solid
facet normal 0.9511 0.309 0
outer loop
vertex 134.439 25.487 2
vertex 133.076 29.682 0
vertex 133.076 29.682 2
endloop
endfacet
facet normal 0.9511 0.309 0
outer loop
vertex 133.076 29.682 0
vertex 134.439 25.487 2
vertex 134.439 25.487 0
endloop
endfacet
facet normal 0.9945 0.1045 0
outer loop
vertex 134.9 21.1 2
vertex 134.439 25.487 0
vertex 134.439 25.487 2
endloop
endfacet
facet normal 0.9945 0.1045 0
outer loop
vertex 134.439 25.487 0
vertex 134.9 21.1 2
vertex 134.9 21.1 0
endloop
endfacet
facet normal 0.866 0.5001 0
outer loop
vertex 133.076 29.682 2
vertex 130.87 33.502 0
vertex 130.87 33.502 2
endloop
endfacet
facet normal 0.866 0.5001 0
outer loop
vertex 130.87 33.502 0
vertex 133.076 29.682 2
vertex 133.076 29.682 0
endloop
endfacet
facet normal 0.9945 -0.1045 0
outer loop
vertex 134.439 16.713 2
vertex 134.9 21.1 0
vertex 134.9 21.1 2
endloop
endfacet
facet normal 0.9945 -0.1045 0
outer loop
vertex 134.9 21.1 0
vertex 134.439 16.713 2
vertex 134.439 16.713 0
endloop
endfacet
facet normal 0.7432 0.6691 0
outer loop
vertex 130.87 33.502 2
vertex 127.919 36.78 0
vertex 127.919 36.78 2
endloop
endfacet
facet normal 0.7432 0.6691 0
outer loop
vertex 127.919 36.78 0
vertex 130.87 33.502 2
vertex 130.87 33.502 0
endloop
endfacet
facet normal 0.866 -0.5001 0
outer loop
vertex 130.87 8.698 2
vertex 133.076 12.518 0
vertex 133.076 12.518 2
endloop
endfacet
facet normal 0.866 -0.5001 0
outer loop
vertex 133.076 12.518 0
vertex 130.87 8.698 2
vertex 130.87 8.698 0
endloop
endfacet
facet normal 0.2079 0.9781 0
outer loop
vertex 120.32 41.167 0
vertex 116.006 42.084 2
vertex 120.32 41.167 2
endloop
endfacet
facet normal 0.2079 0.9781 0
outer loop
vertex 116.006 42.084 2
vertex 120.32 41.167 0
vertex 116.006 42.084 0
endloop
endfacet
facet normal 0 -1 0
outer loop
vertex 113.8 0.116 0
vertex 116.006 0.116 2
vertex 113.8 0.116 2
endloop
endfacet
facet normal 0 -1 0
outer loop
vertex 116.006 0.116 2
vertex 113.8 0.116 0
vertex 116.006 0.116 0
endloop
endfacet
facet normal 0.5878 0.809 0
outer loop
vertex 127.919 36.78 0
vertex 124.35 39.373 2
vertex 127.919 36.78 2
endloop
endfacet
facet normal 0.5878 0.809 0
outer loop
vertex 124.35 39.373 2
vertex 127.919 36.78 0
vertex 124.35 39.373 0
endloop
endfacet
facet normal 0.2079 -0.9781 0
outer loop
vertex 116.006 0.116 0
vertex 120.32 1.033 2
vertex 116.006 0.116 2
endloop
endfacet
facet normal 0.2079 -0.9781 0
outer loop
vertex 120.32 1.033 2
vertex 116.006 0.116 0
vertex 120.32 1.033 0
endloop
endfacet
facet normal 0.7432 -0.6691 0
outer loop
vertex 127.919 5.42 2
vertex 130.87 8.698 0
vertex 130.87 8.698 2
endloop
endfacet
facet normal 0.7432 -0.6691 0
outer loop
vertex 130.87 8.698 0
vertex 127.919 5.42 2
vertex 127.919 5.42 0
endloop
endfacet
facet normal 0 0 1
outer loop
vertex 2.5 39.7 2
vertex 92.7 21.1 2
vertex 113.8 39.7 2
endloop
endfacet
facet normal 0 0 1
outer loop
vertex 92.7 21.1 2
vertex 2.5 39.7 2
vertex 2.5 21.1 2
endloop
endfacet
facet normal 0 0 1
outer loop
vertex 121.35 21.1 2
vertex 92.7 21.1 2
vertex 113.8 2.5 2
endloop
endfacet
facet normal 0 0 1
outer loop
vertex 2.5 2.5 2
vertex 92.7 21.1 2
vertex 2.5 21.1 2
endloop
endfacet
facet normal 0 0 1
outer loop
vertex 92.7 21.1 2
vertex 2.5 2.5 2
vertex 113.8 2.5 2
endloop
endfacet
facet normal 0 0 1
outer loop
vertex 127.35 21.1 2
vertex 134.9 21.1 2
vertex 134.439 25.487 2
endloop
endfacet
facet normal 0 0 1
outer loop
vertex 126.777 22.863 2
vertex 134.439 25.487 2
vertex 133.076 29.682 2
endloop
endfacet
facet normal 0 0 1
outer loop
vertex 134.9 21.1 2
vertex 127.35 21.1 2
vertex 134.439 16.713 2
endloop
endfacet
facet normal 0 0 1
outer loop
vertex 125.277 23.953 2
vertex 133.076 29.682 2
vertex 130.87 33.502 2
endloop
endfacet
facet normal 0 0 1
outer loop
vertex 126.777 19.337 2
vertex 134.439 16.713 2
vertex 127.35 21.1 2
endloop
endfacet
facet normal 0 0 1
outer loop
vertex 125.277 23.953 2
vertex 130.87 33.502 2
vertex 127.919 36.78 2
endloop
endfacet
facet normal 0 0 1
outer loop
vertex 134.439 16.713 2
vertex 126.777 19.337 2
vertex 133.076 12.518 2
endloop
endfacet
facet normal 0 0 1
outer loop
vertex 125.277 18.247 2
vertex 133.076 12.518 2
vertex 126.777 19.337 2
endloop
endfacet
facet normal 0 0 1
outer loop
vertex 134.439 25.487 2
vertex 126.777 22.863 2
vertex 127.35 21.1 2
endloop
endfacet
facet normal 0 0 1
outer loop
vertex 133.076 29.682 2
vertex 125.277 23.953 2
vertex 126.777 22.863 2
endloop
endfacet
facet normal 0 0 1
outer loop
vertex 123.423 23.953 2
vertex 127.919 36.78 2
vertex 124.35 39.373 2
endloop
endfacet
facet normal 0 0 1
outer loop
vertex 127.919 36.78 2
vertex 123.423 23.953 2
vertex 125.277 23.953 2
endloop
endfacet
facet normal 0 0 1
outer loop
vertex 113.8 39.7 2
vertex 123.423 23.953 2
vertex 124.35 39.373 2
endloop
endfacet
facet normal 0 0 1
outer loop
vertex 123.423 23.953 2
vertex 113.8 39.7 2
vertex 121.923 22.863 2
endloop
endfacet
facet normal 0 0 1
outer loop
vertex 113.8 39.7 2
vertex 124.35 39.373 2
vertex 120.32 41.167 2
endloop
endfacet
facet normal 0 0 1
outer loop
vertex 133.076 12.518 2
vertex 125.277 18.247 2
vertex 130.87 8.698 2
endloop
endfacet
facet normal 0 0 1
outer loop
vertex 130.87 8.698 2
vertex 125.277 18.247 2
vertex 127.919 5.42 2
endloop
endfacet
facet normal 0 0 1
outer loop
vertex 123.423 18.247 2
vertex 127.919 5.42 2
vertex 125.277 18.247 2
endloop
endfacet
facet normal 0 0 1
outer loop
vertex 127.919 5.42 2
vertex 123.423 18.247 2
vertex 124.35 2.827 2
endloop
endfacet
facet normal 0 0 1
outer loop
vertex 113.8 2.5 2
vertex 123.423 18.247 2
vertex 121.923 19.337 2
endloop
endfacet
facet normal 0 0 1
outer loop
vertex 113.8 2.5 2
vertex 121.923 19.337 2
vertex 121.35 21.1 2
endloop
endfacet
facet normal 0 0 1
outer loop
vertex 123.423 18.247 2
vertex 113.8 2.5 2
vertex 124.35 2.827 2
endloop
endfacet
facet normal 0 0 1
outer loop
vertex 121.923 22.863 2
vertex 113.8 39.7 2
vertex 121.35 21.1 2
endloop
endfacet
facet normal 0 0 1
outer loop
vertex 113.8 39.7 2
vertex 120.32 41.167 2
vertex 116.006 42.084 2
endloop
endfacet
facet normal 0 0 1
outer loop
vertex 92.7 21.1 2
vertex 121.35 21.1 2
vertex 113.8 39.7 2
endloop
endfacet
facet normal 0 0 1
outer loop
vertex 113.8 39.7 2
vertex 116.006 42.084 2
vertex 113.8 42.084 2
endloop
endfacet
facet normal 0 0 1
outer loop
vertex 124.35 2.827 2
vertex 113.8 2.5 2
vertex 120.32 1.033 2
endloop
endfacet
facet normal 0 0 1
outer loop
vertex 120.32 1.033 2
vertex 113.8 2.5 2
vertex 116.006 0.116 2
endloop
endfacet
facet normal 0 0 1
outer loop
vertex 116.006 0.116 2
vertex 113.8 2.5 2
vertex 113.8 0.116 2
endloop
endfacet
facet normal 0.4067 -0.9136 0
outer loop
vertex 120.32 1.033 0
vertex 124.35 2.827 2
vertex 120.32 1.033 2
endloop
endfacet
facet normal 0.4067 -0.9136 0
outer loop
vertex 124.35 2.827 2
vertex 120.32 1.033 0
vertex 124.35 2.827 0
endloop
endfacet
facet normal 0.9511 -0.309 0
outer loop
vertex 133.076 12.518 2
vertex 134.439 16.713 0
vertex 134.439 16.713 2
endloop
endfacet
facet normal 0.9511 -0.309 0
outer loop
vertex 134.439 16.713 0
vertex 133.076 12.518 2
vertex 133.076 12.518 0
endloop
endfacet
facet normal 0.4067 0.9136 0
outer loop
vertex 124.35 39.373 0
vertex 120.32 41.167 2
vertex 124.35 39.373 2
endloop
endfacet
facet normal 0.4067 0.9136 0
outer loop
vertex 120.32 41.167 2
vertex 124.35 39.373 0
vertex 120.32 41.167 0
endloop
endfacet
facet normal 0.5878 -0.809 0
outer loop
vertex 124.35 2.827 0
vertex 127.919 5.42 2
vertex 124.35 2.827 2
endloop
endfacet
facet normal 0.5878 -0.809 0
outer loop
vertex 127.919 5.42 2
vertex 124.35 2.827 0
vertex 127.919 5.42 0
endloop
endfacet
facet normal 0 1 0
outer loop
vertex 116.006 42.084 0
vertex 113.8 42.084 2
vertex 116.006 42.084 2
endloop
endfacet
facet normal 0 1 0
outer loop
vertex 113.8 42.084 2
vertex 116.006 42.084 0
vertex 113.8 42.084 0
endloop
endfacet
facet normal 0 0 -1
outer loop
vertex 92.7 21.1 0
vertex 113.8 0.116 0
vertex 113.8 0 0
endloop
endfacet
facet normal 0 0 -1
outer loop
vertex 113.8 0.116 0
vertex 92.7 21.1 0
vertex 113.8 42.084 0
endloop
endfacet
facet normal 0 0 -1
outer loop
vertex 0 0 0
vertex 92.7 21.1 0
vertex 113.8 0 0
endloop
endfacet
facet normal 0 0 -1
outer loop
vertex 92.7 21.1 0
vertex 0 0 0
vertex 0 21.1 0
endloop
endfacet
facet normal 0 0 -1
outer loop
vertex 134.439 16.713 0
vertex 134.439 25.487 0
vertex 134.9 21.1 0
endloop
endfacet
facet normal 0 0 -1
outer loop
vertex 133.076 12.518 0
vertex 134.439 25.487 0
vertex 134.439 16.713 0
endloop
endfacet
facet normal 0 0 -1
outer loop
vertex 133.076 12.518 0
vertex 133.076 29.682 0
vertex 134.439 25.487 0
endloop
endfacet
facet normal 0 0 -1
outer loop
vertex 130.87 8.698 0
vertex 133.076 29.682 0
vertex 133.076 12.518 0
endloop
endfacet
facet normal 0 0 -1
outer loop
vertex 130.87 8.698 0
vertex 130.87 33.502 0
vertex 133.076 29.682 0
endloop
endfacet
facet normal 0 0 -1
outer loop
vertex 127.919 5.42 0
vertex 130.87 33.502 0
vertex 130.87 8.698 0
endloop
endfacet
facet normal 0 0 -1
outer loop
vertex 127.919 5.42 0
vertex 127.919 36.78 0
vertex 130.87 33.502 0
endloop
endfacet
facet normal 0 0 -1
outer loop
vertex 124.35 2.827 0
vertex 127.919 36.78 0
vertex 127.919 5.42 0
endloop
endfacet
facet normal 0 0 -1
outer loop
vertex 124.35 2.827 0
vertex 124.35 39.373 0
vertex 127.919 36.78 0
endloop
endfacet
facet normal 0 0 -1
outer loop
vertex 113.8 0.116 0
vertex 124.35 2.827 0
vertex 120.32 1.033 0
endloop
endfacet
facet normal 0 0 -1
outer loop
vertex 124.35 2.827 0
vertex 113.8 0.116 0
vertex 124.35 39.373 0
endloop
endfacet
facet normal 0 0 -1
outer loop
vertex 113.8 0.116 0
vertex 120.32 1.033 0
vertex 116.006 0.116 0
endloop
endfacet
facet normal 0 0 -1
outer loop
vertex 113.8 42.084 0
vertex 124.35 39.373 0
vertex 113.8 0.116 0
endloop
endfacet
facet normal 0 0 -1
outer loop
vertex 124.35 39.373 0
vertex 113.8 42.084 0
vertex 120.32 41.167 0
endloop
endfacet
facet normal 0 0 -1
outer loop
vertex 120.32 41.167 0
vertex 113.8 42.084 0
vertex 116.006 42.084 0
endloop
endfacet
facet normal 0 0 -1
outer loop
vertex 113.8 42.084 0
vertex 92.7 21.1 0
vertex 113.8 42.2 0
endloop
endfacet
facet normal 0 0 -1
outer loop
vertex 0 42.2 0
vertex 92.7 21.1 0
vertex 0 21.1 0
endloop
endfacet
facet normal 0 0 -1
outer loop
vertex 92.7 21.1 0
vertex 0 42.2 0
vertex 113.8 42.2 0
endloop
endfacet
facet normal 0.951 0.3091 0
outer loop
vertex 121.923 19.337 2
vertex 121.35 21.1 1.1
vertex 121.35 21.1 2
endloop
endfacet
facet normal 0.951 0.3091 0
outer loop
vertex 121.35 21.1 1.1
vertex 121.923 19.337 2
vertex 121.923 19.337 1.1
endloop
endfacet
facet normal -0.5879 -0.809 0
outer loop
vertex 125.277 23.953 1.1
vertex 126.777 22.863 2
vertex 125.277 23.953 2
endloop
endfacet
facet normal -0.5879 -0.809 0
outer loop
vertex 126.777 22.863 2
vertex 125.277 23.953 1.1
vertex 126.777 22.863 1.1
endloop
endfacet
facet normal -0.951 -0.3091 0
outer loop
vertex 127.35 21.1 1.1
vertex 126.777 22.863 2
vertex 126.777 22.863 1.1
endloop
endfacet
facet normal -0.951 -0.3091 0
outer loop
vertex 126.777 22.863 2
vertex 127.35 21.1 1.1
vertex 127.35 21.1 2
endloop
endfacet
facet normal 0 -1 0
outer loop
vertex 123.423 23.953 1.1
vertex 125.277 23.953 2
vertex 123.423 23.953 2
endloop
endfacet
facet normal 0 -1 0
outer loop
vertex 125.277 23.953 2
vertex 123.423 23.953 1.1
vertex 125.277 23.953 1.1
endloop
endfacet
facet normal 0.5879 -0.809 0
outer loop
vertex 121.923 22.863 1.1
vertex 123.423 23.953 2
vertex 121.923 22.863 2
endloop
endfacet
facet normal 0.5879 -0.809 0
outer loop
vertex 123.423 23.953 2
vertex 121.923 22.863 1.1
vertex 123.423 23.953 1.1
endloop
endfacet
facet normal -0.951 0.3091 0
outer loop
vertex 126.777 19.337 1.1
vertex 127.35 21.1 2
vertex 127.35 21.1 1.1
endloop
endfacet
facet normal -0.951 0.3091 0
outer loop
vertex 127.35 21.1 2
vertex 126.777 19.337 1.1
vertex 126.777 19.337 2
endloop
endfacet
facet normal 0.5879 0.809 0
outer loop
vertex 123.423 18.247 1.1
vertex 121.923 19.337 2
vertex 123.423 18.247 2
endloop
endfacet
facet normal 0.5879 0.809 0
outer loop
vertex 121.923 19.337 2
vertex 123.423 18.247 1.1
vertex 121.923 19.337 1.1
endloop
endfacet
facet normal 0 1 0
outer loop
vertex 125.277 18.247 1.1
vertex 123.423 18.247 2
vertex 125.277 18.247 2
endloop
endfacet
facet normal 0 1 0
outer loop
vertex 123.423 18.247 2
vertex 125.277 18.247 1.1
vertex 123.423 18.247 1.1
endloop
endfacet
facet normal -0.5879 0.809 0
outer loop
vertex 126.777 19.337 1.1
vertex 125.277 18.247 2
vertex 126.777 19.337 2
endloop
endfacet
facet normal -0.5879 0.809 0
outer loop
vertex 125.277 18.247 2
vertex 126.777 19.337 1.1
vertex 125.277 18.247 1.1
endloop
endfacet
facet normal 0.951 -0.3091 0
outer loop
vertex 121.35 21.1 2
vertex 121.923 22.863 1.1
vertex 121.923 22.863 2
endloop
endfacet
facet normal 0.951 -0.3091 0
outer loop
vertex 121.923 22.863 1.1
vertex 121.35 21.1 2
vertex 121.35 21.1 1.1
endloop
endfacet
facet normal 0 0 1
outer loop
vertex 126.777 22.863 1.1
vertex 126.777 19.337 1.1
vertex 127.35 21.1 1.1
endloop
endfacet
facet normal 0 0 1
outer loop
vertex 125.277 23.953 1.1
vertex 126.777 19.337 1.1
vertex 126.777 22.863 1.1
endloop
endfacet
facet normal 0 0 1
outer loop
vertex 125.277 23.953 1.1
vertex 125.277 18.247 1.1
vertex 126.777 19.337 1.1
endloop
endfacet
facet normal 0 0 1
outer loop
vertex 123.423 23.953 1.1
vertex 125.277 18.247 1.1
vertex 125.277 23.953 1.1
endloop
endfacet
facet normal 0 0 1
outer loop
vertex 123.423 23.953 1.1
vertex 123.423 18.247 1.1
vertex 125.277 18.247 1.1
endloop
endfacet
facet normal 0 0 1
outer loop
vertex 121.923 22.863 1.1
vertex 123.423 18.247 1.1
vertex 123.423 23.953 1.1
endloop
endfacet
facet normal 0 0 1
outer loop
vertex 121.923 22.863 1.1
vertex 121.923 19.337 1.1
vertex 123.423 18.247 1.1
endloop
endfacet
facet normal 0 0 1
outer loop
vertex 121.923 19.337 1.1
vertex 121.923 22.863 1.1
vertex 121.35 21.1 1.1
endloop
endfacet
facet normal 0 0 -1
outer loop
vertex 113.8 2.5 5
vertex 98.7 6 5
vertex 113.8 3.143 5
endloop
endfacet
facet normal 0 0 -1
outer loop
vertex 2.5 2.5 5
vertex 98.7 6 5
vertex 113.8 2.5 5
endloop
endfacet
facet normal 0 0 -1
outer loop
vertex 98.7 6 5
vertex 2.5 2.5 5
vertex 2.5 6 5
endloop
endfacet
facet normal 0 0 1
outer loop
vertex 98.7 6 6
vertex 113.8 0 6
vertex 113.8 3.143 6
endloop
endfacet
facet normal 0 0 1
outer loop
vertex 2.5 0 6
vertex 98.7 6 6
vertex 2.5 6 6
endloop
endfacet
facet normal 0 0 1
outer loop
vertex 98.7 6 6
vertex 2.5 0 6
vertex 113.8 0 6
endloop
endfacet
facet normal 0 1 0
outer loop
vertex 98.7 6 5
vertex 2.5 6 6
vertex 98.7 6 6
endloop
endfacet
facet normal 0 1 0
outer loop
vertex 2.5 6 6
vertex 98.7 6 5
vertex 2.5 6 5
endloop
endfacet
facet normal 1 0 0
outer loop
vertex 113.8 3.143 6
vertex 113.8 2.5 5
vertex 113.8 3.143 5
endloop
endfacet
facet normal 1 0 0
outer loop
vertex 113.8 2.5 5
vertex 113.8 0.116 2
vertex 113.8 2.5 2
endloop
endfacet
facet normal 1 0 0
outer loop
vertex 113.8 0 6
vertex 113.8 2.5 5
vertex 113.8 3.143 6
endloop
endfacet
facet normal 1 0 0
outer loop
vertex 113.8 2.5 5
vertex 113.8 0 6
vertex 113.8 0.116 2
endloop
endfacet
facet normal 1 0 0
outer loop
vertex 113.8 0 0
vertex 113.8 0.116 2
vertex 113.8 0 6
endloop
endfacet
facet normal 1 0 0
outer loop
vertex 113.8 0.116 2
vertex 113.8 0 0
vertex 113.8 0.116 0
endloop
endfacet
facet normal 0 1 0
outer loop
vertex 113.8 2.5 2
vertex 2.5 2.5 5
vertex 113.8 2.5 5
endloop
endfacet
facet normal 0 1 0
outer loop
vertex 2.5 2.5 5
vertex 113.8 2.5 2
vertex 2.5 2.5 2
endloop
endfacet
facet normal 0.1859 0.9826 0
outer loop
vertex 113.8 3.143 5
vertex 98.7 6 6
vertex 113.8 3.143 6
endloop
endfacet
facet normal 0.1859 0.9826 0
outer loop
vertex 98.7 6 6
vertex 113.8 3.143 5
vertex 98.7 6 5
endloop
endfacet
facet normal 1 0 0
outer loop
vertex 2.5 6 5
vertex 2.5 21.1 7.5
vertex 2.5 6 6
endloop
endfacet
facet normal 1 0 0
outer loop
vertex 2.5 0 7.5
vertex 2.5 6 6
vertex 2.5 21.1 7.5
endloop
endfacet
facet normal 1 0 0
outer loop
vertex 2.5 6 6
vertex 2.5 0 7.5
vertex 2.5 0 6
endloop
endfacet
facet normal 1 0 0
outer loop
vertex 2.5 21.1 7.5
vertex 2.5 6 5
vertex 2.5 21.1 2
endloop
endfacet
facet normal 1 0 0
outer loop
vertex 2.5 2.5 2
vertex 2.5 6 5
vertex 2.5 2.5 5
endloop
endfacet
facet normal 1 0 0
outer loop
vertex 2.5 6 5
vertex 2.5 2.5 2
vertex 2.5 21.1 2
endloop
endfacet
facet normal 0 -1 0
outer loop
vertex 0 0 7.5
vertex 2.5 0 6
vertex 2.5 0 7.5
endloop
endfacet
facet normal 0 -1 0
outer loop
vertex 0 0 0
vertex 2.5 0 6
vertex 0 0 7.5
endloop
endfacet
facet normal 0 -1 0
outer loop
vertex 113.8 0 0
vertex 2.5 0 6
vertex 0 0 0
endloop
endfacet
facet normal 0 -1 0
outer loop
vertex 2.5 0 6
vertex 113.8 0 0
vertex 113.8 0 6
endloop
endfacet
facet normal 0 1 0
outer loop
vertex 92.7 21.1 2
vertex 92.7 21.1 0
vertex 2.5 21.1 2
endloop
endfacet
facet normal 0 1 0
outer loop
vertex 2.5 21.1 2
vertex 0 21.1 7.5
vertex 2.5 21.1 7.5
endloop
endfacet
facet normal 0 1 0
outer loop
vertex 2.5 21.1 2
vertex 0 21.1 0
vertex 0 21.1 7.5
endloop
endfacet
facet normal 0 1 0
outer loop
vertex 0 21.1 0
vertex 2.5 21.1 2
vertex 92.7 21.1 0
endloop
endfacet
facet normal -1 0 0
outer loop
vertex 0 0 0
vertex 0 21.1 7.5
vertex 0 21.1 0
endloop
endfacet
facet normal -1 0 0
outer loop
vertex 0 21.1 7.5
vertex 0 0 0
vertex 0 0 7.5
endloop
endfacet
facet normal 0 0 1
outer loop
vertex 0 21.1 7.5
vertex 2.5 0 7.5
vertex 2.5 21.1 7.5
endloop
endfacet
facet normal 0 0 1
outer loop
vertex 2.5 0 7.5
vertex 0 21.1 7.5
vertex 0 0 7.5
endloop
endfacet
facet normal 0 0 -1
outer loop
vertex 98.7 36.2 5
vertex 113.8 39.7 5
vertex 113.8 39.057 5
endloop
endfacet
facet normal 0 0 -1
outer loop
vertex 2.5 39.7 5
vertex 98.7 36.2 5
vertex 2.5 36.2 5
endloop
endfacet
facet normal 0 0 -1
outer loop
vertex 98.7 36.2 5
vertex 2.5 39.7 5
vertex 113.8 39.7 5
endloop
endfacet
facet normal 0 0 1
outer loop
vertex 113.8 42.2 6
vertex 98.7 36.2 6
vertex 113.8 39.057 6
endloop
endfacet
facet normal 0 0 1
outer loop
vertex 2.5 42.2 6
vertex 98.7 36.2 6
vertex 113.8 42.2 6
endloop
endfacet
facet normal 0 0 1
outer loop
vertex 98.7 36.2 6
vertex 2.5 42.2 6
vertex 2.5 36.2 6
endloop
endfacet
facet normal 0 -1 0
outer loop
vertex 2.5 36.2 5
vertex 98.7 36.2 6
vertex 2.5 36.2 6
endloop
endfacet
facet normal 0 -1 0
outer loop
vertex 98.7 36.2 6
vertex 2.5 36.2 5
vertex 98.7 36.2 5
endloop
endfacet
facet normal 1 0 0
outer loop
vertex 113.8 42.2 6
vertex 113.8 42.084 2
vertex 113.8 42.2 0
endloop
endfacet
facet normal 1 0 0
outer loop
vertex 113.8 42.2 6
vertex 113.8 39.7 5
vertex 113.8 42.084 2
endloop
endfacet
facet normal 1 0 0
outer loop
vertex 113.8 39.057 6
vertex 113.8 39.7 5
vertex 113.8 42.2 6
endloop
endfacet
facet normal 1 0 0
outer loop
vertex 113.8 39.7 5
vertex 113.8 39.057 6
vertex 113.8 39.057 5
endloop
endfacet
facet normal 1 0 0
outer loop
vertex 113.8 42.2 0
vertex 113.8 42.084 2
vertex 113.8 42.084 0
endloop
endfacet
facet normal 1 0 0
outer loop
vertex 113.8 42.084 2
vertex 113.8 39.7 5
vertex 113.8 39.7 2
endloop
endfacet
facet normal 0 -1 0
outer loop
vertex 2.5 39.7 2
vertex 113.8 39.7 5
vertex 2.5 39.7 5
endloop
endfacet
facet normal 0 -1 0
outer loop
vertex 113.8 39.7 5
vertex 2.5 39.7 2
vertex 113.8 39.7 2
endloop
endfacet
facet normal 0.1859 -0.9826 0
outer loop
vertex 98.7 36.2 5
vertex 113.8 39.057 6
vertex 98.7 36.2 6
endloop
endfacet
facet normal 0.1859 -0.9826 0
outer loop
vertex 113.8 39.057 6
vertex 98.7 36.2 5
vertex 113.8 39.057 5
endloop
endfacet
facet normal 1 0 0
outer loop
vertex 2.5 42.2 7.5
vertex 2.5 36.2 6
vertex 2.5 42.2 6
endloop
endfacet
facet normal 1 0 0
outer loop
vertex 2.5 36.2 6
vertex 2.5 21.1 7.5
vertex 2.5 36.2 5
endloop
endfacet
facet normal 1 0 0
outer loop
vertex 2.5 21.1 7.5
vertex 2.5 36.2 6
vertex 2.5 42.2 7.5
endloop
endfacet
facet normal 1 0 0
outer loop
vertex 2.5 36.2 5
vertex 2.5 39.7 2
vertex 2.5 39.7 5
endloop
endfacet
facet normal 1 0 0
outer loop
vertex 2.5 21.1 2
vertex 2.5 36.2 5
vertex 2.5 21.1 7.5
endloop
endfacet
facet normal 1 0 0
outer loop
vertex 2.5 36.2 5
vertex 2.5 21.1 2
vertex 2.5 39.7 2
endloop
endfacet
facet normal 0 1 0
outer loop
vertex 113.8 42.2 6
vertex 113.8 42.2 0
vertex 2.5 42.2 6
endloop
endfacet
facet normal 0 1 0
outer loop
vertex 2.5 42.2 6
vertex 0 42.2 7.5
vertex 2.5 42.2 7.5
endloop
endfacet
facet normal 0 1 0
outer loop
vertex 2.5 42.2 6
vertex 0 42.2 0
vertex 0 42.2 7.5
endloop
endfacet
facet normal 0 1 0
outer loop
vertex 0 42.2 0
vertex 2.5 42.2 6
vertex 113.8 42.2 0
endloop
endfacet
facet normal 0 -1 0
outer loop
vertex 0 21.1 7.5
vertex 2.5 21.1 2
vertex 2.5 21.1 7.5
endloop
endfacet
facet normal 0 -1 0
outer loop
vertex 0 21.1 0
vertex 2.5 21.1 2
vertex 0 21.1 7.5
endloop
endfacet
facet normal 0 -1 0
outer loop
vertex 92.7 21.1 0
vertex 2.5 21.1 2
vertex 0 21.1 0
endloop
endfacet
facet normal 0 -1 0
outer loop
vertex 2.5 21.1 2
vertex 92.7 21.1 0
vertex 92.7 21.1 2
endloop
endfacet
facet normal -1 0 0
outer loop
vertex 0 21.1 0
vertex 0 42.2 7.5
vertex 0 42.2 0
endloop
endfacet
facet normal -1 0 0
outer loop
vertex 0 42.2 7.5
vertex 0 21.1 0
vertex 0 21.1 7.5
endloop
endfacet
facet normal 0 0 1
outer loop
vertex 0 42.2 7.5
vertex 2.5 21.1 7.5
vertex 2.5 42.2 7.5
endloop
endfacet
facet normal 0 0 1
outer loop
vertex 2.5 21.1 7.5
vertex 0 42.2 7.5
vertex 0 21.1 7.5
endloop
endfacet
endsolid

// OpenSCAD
TOLERANCE           = 0.2;
SIZE_X              = 37;
SIZE_Y              = (37 + TOLERANCE) / 2;
COUNT               = 3;

PADDING             = 0.1;
BASE_HEIGHT         = 2;
STOPPER_Y           = 3.0;
STOPPER_HEIGHT      = 1;
STOPPER_WIDTH       = 3.5;
WALL_WIDTH          = 2.5;
WALL_HEIGHT         = BASE_HEIGHT + STOPPER_Y + STOPPER_HEIGHT;
END_STOPPER_HEIGHT  = WALL_HEIGHT + 1.5;

function pos_x(j) = WALL_WIDTH + (SIZE_X + PADDING)  * (j - 1);

module half() {
  for(i=[1:1:COUNT]) {

    // Walls
    translate([pos_x(i), 0, 0]) {
      color("DarkKhaki") {
        linear_extrude(WALL_HEIGHT) {
          square([SIZE_X + PADDING, WALL_WIDTH]);
        }
      }
    }

    // Stoppers
    difference() {
      translate([pos_x(i), WALL_WIDTH, BASE_HEIGHT + STOPPER_Y]) {
        color("DeepSkyBlue") {
          linear_extrude(STOPPER_HEIGHT) {
            square([SIZE_X + PADDING, STOPPER_WIDTH]);
          }
        }
      }

      if (i == COUNT) {
        translate([pos_x(COUNT),WALL_WIDTH,BASE_HEIGHT + STOPPER_Y])
          linear_extrude(STOPPER_HEIGHT) {
            polygon([[1 + WALL_WIDTH + SIZE_X/2, STOPPER_WIDTH],
                [1 + WALL_WIDTH + SIZE_X, 0],
                [1 + WALL_WIDTH + SIZE_X, STOPPER_WIDTH]]);
          }
      }
    }


    // Cup Platform
    translate([pos_x(i), WALL_WIDTH, 0]) {
      color("red") {
        linear_extrude(BASE_HEIGHT) {
          square([SIZE_X, SIZE_Y]);
        }
      }
    }

    // PADDINGS
    translate([pos_x(i) + SIZE_X, WALL_WIDTH, 0]) {
      color("DarkGreen") {
        linear_extrude(BASE_HEIGHT) {
          square([PADDING, SIZE_Y]);
        }
      }
    }

  }


  // End Stopper
  translate([0,0,0]) {
    color("YellowGreen") {
      linear_extrude(END_STOPPER_HEIGHT) {
        square([WALL_WIDTH, SIZE_Y + WALL_WIDTH]);
      }
    }
  }

  // Supports
//support_count = 10;
//for(i=[SIZE_X/support_count:SIZE_X/support_count:SIZE_X]) {
//  radius = 0.4;
//  translate([radius + i, STOPPER_WIDTH / 2 + WALL_WIDTH, BASE_HEIGHT])
//    cylinder(h=STOPPER_Y, r=radius, center=false);
//}
}

// Holder
translate([pos_x(COUNT) + PADDING + SIZE_X, SIZE_Y + WALL_WIDTH,0]) {
  color("Magenta") {
    difference() {
      cylinder(h=BASE_HEIGHT, r=(SIZE_Y + WALL_WIDTH), center=false);
      translate([(SIZE_Y + WALL_WIDTH)/2,0, 1.1])
      #cylinder(h=BASE_HEIGHT, r=3, center=false);
    }
  }
}

half();
translate([0, 2 * (SIZE_Y + WALL_WIDTH), 0])
mirror([0,1,0]) half();
